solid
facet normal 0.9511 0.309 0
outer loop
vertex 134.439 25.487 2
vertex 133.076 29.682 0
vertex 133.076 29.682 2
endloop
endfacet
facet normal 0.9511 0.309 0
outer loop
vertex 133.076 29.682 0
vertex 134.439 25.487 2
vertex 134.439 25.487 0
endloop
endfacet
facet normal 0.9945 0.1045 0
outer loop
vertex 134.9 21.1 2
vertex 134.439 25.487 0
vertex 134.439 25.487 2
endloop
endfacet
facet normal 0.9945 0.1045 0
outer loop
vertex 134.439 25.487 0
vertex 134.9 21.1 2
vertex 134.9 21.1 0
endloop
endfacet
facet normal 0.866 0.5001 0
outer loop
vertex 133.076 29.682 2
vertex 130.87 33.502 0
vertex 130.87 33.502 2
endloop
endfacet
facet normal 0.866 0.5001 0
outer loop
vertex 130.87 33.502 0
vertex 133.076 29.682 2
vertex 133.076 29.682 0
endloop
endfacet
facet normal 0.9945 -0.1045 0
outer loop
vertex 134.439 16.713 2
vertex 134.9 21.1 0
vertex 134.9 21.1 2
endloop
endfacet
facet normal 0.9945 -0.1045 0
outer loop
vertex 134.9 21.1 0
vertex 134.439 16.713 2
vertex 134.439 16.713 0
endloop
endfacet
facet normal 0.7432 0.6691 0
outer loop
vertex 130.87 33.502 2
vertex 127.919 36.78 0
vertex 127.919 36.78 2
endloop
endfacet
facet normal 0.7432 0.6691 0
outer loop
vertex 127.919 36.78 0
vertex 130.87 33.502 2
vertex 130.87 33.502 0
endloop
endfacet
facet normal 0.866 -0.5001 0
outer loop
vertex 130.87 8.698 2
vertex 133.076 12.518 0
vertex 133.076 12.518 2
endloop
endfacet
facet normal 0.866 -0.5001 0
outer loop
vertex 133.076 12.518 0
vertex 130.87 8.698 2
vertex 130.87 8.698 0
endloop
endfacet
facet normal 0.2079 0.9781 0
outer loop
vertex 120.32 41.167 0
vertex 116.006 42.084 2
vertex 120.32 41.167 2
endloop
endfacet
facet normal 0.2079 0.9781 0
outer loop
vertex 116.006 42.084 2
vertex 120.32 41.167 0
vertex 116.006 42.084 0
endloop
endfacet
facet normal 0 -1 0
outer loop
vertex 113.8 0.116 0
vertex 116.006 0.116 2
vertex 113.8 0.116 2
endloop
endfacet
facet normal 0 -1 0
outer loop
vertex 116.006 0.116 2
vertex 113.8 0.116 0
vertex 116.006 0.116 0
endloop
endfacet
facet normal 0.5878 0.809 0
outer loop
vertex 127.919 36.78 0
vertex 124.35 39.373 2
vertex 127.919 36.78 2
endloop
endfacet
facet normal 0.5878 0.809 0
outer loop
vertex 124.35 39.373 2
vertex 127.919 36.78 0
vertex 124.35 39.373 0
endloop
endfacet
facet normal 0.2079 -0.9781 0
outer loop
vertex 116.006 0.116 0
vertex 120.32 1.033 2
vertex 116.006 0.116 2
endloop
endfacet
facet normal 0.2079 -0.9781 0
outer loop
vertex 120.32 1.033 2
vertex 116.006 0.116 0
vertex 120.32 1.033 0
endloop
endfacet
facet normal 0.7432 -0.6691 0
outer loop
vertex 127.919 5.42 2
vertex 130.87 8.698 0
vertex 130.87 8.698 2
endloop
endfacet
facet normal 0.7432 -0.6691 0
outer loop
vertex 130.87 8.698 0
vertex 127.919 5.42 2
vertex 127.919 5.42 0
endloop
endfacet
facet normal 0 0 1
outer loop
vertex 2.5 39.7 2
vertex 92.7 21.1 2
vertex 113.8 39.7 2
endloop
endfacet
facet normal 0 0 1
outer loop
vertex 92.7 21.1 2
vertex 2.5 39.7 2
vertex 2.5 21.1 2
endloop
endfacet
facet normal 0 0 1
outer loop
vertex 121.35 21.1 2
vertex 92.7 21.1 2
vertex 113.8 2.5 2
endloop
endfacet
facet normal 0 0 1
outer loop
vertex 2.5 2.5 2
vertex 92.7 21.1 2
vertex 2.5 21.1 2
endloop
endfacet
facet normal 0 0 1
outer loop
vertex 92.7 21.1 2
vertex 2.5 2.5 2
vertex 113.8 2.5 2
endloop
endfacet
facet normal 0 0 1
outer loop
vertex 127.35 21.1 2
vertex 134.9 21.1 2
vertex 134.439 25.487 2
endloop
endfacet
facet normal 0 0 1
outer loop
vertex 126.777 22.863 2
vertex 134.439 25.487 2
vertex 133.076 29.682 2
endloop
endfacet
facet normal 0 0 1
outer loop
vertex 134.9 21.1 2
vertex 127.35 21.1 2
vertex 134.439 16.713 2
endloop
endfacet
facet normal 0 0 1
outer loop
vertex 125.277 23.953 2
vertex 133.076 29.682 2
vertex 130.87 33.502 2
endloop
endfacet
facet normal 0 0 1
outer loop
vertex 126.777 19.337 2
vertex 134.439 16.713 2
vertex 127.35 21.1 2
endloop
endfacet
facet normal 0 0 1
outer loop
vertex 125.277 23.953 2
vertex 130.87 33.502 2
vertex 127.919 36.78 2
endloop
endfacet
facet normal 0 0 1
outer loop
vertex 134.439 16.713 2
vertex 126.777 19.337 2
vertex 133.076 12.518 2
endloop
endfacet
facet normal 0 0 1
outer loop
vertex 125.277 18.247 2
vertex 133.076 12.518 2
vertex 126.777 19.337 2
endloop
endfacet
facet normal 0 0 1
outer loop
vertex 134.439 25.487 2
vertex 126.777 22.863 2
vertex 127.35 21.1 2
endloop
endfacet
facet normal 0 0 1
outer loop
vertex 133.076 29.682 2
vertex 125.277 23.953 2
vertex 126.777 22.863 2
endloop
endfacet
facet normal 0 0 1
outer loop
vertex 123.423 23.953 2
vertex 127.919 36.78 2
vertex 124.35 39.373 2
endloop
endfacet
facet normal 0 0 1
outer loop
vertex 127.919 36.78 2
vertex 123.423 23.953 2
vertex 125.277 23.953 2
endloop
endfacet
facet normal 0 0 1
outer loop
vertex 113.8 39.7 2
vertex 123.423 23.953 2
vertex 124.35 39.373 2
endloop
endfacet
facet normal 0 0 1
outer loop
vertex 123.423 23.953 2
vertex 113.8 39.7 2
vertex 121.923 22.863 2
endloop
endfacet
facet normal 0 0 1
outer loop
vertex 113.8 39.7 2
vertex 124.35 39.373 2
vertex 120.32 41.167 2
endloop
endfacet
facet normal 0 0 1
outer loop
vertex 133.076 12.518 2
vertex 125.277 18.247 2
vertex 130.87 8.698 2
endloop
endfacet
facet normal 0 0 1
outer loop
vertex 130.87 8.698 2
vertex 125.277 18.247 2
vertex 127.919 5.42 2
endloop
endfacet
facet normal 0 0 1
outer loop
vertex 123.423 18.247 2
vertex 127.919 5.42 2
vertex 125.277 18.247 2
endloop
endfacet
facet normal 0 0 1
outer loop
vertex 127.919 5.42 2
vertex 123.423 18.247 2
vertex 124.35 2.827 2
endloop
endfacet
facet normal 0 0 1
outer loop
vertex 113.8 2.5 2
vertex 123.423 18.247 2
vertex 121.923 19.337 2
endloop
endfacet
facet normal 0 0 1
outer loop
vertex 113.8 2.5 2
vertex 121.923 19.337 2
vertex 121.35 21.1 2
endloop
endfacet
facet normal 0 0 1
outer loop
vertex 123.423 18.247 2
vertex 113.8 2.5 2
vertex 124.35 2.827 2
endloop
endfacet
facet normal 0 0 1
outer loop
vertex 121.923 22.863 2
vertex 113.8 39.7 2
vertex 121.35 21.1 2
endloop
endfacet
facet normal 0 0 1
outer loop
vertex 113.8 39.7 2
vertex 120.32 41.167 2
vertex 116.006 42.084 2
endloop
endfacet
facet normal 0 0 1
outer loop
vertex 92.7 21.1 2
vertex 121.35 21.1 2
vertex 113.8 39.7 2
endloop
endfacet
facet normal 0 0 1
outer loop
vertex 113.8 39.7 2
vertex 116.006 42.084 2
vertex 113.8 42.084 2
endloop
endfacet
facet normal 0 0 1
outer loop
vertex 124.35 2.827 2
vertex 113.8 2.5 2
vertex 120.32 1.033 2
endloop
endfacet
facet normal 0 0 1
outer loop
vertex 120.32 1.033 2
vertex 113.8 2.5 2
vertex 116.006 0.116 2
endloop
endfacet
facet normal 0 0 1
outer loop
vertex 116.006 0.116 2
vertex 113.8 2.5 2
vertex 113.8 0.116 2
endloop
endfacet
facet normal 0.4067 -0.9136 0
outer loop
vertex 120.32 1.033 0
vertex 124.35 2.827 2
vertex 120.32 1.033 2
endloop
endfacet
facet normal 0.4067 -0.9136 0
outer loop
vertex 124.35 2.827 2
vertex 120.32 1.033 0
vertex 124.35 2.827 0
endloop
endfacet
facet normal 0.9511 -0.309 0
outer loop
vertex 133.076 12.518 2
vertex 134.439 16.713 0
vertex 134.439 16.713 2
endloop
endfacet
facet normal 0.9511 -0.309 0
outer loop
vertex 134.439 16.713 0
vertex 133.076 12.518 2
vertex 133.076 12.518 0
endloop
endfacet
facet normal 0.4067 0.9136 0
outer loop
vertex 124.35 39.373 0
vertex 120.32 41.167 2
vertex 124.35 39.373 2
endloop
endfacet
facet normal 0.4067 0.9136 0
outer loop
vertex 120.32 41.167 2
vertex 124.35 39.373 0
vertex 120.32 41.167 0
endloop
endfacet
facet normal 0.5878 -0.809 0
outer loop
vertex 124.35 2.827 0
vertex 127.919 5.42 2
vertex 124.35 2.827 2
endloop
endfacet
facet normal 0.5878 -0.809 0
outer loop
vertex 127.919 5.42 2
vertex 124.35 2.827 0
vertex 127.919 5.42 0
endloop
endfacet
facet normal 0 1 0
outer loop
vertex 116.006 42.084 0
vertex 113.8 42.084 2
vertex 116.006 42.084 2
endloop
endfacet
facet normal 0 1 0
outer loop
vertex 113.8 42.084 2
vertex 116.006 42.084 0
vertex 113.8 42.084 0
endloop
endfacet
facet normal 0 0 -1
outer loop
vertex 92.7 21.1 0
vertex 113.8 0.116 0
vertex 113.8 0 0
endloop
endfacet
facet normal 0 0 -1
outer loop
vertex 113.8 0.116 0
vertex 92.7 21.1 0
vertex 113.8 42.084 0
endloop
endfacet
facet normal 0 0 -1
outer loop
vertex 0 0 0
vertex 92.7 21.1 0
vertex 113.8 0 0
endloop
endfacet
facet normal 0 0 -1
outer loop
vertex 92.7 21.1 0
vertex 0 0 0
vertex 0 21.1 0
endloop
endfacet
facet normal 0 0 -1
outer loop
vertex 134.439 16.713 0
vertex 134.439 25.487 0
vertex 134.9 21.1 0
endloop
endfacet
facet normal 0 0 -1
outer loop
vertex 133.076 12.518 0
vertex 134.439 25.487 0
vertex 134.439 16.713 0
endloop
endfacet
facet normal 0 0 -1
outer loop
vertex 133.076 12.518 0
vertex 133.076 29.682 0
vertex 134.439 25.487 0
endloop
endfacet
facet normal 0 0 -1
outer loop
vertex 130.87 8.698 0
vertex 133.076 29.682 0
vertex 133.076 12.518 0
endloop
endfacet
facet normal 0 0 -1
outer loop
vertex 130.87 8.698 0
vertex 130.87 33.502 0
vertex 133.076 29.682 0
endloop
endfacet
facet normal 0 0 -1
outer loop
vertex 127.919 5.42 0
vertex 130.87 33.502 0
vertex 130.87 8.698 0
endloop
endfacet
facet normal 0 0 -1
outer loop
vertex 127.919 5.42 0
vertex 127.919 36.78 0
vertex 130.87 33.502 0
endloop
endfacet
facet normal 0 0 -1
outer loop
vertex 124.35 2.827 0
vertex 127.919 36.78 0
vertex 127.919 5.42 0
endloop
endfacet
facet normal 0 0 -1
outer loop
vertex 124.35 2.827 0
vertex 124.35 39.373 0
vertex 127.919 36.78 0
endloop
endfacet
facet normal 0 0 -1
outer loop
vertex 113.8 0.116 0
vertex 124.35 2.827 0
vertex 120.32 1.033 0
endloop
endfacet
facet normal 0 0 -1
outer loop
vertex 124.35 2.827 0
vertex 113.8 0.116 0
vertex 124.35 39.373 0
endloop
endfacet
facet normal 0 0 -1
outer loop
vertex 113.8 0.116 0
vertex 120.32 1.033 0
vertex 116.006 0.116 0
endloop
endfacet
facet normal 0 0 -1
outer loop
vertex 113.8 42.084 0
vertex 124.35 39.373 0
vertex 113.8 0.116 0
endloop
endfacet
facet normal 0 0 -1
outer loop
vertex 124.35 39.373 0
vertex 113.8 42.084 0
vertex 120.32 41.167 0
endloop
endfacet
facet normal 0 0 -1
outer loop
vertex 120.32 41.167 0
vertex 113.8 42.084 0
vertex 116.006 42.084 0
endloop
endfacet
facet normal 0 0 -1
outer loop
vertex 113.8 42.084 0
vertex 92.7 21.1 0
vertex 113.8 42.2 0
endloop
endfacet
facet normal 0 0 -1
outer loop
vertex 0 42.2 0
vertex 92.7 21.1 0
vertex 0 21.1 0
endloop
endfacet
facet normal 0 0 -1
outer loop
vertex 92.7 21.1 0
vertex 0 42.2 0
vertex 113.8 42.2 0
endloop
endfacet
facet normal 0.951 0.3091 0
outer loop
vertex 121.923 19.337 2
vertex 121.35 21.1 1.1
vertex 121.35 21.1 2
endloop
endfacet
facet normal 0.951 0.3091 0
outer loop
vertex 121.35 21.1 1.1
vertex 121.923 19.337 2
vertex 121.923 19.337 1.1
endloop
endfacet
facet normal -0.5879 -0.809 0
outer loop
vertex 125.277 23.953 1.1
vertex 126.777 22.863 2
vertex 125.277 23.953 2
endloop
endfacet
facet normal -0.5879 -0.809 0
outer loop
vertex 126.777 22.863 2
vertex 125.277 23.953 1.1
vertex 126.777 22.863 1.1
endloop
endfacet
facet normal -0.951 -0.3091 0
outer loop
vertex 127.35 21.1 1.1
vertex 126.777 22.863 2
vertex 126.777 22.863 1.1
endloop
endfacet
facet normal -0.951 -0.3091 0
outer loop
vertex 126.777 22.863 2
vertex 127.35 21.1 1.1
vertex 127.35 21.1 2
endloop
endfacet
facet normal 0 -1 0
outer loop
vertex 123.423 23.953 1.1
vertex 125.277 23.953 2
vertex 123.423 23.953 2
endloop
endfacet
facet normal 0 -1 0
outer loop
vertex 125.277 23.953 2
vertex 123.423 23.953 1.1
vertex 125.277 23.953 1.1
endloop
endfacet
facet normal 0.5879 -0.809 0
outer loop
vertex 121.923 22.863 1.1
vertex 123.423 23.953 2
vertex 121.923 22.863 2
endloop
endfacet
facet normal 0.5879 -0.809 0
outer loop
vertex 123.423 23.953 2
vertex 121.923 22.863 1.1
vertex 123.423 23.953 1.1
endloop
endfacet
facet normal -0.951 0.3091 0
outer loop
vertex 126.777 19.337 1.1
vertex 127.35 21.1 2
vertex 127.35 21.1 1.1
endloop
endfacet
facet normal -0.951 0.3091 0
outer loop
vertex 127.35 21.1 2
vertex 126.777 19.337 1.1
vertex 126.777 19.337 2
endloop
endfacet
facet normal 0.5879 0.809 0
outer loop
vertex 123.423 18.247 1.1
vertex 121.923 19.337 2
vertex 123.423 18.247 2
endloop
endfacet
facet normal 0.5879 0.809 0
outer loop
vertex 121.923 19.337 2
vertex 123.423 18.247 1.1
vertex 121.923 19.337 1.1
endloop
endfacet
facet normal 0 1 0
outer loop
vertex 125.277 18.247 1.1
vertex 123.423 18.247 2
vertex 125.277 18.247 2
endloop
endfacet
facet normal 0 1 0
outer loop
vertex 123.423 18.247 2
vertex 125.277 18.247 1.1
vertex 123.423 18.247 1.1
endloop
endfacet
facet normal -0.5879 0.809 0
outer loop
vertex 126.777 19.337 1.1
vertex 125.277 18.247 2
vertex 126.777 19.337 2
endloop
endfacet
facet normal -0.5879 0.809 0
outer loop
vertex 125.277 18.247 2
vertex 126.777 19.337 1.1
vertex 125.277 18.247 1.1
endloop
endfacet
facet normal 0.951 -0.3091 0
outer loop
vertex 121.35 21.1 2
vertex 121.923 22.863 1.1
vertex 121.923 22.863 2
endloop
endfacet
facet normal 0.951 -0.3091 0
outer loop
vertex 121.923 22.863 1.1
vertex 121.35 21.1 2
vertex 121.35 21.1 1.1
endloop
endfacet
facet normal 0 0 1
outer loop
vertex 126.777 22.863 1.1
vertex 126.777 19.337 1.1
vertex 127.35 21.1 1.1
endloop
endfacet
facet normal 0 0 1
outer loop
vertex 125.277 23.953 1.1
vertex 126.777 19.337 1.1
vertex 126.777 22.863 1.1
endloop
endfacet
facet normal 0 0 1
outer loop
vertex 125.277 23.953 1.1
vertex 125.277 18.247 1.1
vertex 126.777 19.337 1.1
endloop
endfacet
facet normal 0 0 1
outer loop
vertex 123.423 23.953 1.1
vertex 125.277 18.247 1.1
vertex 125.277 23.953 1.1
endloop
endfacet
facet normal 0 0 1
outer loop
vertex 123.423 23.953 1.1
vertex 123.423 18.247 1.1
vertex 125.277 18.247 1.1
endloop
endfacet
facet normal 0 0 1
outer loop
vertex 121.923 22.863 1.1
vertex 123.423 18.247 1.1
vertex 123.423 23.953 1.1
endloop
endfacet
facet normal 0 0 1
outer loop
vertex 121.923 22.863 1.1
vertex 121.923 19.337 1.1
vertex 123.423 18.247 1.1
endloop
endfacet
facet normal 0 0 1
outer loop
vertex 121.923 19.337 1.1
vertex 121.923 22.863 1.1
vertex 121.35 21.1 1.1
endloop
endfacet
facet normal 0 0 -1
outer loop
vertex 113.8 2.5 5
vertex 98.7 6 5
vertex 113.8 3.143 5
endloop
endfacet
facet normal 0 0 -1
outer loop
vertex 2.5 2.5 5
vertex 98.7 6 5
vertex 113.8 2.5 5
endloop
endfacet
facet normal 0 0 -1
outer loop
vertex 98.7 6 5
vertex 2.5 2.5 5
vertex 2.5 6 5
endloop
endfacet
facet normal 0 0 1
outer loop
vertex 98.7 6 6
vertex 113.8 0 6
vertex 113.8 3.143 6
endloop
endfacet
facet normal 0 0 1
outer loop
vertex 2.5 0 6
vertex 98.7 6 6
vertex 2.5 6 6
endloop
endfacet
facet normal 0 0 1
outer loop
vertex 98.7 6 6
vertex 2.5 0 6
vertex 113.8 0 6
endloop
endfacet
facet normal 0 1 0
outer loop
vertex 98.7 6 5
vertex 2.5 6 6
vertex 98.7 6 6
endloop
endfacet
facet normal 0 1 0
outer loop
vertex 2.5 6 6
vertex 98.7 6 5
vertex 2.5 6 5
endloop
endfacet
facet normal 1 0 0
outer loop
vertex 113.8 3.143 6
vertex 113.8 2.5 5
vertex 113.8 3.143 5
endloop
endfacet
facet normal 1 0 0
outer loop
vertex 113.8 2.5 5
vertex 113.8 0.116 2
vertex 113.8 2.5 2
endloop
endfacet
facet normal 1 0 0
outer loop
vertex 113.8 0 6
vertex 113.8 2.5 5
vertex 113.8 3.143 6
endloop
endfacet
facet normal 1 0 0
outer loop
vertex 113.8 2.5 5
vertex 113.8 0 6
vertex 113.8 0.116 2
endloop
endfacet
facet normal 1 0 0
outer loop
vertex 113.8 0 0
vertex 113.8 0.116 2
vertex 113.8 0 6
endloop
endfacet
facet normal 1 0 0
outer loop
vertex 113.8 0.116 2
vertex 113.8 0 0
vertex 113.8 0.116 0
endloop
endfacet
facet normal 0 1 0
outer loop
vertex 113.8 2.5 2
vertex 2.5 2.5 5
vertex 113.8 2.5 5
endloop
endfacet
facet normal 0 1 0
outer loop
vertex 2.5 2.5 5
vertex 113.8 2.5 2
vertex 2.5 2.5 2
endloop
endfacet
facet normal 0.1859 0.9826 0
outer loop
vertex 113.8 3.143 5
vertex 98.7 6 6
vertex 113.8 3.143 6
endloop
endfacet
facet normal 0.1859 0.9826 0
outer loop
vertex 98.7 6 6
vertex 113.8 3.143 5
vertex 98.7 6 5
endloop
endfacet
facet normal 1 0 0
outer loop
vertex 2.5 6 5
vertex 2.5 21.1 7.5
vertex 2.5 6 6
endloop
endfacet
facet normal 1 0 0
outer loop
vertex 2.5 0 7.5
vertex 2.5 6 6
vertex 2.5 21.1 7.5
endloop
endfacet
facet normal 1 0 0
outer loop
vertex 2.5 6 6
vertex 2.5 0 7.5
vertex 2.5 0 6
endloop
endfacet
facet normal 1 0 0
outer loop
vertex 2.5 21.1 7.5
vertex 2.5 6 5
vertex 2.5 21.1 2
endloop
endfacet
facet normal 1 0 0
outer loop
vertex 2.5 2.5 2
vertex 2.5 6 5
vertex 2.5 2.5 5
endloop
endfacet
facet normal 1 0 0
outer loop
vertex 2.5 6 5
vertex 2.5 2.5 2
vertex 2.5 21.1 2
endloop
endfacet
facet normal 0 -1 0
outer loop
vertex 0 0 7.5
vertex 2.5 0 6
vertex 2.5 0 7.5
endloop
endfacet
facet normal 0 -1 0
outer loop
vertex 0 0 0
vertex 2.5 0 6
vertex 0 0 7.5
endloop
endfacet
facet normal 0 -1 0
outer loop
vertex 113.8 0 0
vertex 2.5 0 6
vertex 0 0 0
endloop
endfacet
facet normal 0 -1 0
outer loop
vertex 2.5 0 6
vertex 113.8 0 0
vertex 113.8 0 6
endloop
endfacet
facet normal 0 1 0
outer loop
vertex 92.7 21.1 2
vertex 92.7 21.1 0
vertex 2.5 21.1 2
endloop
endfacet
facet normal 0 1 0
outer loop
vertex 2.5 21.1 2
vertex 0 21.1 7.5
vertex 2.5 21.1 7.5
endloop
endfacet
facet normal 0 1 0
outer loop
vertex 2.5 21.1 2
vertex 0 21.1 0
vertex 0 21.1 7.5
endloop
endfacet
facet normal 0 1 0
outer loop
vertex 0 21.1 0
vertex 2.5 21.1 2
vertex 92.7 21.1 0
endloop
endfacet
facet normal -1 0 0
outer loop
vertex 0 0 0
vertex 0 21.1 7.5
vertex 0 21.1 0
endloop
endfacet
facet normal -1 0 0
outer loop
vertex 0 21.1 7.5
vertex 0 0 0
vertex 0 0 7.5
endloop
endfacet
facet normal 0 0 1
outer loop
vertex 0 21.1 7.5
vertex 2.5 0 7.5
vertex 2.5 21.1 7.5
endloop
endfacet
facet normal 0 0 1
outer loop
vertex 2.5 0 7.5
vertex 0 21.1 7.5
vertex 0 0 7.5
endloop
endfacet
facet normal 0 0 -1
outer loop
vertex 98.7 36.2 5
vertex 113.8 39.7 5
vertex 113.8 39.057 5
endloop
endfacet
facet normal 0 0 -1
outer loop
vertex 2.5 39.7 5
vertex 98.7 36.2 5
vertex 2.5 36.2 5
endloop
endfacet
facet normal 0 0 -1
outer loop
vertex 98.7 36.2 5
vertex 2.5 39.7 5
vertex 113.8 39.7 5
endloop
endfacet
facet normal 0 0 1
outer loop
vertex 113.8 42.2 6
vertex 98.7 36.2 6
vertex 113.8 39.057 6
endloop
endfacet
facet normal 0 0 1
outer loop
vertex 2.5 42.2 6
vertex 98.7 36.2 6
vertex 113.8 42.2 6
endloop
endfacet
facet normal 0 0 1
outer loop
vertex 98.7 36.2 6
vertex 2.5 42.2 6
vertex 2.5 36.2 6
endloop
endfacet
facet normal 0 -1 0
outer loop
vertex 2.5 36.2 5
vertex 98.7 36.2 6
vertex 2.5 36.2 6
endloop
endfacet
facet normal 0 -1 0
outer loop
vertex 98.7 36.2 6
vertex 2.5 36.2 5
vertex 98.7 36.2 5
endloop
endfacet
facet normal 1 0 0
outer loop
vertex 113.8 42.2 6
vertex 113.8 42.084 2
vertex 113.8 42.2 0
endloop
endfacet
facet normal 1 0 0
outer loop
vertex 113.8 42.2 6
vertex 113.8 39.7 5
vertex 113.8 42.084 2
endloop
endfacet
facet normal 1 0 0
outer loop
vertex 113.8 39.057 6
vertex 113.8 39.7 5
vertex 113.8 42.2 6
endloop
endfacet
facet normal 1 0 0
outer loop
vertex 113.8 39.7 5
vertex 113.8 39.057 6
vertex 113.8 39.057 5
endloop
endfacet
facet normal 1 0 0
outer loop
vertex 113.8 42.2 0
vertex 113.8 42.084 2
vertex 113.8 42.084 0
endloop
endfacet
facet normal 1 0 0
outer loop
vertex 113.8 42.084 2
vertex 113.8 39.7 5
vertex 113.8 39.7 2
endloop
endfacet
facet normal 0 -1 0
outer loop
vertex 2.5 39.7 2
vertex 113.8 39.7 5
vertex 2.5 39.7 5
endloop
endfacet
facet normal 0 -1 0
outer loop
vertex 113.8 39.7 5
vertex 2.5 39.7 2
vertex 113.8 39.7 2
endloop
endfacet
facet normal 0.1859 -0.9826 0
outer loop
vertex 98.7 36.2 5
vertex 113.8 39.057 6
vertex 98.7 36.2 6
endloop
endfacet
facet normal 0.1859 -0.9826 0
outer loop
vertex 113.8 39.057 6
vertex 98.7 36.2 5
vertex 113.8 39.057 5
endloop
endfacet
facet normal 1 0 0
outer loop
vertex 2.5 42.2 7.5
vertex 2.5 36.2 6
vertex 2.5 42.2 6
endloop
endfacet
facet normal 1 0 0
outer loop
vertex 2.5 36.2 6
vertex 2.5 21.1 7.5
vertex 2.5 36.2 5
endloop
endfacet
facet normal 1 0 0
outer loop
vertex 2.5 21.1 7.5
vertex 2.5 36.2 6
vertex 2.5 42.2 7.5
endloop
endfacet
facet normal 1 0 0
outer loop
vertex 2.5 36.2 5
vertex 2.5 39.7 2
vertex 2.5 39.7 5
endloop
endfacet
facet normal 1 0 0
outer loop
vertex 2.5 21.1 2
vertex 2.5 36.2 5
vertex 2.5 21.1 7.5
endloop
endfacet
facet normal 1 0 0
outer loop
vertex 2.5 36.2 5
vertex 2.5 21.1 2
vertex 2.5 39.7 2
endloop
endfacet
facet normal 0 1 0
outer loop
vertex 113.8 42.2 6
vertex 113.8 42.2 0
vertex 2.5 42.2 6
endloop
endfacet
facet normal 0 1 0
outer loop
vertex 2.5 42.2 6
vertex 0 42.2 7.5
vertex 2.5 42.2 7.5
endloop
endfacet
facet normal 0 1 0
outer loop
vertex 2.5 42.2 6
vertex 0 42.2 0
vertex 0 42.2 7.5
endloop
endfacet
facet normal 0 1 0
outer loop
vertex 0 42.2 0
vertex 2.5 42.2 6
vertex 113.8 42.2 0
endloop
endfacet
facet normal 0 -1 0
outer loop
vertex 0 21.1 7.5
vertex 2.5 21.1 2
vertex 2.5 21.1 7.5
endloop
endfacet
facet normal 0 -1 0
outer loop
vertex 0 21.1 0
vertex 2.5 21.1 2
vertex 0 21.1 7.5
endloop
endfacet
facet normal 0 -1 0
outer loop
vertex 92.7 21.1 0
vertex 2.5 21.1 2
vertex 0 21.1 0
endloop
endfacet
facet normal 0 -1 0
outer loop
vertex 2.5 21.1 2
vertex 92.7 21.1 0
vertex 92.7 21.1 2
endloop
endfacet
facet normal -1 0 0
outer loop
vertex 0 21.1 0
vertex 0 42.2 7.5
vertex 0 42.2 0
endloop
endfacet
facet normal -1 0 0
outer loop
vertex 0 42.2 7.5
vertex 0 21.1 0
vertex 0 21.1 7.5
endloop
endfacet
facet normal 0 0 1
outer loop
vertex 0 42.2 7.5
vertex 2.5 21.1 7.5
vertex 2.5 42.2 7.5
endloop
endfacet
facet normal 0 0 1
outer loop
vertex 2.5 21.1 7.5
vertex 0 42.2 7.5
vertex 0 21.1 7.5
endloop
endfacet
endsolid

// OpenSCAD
TOLERANCE           = 0.2;
SIZE_X              = 37;
SIZE_Y              = (37 + TOLERANCE) / 2;
COUNT               = 3;

PADDING             = 0.1;
BASE_HEIGHT         = 2;
STOPPER_Y           = 3.0;
STOPPER_HEIGHT      = 1;
STOPPER_WIDTH       = 3.5;
WALL_WIDTH          = 2.5;
WALL_HEIGHT         = BASE_HEIGHT + STOPPER_Y + STOPPER_HEIGHT;
END_STOPPER_HEIGHT  = WALL_HEIGHT + 1.5;

function pos_x(j) = WALL_WIDTH + (SIZE_X + PADDING)  * (j - 1);

module half() {
  for(i=[1:1:COUNT]) {

    // Walls
    translate([pos_x(i), 0, 0]) {
      color("DarkKhaki") {
        linear_extrude(WALL_HEIGHT) {
          square([SIZE_X + PADDING, WALL_WIDTH]);
        }
      }
    }

    // Stoppers
    difference() {
      translate([pos_x(i), WALL_WIDTH, BASE_HEIGHT + STOPPER_Y]) {
        color("DeepSkyBlue") {
          linear_extrude(STOPPER_HEIGHT) {
            square([SIZE_X + PADDING, STOPPER_WIDTH]);
          }
        }
      }

      if (i == COUNT) {
        translate([pos_x(COUNT),WALL_WIDTH,BASE_HEIGHT + STOPPER_Y])
          linear_extrude(STOPPER_HEIGHT) {
            polygon([[1 + WALL_WIDTH + SIZE_X/2, STOPPER_WIDTH],
                [1 + WALL_WIDTH + SIZE_X, 0],
                [1 + WALL_WIDTH + SIZE_X, STOPPER_WIDTH]]);
          }
      }
    }


    // Cup Platform
    translate([pos_x(i), WALL_WIDTH, 0]) {
      color("red") {
        linear_extrude(BASE_HEIGHT) {
          square([SIZE_X, SIZE_Y]);
        }
      }
    }

    // PADDINGS
    translate([pos_x(i) + SIZE_X, WALL_WIDTH, 0]) {
      color("DarkGreen") {
        linear_extrude(BASE_HEIGHT) {
          square([PADDING, SIZE_Y]);
        }
      }
    }

  }


  // End Stopper
  translate([0,0,0]) {
    color("YellowGreen") {
      linear_extrude(END_STOPPER_HEIGHT) {
        square([WALL_WIDTH, SIZE_Y + WALL_WIDTH]);
      }
    }
  }

  // Supports
//support_count = 10;
//for(i=[SIZE_X/support_count:SIZE_X/support_count:SIZE_X]) {
//  radius = 0.4;
//  translate([radius + i, STOPPER_WIDTH / 2 + WALL_WIDTH, BASE_HEIGHT])
//    cylinder(h=STOPPER_Y, r=radius, center=false);
//}
}

// Holder
translate([pos_x(COUNT) + PADDING + SIZE_X, SIZE_Y + WALL_WIDTH,0]) {
  color("Magenta") {
    difference() {
      cylinder(h=BASE_HEIGHT, r=(SIZE_Y + WALL_WIDTH), center=false);
      translate([(SIZE_Y + WALL_WIDTH)/2,0, 1.1])
      #cylinder(h=BASE_HEIGHT, r=3, center=false);
    }
  }
}

half();
translate([0, 2 * (SIZE_Y + WALL_WIDTH), 0])
mirror([0,1,0]) half();
